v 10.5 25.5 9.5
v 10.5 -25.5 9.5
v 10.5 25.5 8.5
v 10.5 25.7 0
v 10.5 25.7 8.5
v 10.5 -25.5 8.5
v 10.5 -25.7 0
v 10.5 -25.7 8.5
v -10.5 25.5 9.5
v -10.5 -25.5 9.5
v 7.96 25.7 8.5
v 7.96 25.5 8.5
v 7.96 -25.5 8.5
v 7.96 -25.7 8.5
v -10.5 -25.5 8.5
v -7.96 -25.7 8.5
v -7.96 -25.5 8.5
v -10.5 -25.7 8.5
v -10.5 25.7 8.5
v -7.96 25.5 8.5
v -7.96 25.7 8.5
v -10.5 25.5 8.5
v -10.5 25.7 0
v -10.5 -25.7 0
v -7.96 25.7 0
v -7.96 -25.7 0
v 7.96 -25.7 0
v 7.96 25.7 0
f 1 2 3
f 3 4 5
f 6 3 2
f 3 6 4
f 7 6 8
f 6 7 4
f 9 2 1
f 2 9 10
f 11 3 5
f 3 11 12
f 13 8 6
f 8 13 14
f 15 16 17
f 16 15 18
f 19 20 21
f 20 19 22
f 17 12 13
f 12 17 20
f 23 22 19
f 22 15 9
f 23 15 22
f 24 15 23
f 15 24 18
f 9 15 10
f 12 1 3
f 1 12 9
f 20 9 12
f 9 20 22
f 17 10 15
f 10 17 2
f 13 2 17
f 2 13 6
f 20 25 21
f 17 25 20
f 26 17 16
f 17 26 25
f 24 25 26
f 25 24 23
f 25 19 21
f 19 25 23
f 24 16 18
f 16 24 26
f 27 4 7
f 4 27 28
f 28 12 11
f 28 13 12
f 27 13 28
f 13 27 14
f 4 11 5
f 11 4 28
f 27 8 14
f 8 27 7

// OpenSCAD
module pico() {
  translate([0, 0, 9])
  cube([21, 51, 1], center=true);
  header_len = 0.6+2.54*20;
  color("black")
  translate([-10.5+2.54/2, 0, 8.5/2])
  cube([2.54, header_len, 8.5], center=true);
  color("black")
  translate([10.5-2.54/2, 0, 8.5/2])
  cube([2.54, header_len, 8.5], center=true);
}

pico();
